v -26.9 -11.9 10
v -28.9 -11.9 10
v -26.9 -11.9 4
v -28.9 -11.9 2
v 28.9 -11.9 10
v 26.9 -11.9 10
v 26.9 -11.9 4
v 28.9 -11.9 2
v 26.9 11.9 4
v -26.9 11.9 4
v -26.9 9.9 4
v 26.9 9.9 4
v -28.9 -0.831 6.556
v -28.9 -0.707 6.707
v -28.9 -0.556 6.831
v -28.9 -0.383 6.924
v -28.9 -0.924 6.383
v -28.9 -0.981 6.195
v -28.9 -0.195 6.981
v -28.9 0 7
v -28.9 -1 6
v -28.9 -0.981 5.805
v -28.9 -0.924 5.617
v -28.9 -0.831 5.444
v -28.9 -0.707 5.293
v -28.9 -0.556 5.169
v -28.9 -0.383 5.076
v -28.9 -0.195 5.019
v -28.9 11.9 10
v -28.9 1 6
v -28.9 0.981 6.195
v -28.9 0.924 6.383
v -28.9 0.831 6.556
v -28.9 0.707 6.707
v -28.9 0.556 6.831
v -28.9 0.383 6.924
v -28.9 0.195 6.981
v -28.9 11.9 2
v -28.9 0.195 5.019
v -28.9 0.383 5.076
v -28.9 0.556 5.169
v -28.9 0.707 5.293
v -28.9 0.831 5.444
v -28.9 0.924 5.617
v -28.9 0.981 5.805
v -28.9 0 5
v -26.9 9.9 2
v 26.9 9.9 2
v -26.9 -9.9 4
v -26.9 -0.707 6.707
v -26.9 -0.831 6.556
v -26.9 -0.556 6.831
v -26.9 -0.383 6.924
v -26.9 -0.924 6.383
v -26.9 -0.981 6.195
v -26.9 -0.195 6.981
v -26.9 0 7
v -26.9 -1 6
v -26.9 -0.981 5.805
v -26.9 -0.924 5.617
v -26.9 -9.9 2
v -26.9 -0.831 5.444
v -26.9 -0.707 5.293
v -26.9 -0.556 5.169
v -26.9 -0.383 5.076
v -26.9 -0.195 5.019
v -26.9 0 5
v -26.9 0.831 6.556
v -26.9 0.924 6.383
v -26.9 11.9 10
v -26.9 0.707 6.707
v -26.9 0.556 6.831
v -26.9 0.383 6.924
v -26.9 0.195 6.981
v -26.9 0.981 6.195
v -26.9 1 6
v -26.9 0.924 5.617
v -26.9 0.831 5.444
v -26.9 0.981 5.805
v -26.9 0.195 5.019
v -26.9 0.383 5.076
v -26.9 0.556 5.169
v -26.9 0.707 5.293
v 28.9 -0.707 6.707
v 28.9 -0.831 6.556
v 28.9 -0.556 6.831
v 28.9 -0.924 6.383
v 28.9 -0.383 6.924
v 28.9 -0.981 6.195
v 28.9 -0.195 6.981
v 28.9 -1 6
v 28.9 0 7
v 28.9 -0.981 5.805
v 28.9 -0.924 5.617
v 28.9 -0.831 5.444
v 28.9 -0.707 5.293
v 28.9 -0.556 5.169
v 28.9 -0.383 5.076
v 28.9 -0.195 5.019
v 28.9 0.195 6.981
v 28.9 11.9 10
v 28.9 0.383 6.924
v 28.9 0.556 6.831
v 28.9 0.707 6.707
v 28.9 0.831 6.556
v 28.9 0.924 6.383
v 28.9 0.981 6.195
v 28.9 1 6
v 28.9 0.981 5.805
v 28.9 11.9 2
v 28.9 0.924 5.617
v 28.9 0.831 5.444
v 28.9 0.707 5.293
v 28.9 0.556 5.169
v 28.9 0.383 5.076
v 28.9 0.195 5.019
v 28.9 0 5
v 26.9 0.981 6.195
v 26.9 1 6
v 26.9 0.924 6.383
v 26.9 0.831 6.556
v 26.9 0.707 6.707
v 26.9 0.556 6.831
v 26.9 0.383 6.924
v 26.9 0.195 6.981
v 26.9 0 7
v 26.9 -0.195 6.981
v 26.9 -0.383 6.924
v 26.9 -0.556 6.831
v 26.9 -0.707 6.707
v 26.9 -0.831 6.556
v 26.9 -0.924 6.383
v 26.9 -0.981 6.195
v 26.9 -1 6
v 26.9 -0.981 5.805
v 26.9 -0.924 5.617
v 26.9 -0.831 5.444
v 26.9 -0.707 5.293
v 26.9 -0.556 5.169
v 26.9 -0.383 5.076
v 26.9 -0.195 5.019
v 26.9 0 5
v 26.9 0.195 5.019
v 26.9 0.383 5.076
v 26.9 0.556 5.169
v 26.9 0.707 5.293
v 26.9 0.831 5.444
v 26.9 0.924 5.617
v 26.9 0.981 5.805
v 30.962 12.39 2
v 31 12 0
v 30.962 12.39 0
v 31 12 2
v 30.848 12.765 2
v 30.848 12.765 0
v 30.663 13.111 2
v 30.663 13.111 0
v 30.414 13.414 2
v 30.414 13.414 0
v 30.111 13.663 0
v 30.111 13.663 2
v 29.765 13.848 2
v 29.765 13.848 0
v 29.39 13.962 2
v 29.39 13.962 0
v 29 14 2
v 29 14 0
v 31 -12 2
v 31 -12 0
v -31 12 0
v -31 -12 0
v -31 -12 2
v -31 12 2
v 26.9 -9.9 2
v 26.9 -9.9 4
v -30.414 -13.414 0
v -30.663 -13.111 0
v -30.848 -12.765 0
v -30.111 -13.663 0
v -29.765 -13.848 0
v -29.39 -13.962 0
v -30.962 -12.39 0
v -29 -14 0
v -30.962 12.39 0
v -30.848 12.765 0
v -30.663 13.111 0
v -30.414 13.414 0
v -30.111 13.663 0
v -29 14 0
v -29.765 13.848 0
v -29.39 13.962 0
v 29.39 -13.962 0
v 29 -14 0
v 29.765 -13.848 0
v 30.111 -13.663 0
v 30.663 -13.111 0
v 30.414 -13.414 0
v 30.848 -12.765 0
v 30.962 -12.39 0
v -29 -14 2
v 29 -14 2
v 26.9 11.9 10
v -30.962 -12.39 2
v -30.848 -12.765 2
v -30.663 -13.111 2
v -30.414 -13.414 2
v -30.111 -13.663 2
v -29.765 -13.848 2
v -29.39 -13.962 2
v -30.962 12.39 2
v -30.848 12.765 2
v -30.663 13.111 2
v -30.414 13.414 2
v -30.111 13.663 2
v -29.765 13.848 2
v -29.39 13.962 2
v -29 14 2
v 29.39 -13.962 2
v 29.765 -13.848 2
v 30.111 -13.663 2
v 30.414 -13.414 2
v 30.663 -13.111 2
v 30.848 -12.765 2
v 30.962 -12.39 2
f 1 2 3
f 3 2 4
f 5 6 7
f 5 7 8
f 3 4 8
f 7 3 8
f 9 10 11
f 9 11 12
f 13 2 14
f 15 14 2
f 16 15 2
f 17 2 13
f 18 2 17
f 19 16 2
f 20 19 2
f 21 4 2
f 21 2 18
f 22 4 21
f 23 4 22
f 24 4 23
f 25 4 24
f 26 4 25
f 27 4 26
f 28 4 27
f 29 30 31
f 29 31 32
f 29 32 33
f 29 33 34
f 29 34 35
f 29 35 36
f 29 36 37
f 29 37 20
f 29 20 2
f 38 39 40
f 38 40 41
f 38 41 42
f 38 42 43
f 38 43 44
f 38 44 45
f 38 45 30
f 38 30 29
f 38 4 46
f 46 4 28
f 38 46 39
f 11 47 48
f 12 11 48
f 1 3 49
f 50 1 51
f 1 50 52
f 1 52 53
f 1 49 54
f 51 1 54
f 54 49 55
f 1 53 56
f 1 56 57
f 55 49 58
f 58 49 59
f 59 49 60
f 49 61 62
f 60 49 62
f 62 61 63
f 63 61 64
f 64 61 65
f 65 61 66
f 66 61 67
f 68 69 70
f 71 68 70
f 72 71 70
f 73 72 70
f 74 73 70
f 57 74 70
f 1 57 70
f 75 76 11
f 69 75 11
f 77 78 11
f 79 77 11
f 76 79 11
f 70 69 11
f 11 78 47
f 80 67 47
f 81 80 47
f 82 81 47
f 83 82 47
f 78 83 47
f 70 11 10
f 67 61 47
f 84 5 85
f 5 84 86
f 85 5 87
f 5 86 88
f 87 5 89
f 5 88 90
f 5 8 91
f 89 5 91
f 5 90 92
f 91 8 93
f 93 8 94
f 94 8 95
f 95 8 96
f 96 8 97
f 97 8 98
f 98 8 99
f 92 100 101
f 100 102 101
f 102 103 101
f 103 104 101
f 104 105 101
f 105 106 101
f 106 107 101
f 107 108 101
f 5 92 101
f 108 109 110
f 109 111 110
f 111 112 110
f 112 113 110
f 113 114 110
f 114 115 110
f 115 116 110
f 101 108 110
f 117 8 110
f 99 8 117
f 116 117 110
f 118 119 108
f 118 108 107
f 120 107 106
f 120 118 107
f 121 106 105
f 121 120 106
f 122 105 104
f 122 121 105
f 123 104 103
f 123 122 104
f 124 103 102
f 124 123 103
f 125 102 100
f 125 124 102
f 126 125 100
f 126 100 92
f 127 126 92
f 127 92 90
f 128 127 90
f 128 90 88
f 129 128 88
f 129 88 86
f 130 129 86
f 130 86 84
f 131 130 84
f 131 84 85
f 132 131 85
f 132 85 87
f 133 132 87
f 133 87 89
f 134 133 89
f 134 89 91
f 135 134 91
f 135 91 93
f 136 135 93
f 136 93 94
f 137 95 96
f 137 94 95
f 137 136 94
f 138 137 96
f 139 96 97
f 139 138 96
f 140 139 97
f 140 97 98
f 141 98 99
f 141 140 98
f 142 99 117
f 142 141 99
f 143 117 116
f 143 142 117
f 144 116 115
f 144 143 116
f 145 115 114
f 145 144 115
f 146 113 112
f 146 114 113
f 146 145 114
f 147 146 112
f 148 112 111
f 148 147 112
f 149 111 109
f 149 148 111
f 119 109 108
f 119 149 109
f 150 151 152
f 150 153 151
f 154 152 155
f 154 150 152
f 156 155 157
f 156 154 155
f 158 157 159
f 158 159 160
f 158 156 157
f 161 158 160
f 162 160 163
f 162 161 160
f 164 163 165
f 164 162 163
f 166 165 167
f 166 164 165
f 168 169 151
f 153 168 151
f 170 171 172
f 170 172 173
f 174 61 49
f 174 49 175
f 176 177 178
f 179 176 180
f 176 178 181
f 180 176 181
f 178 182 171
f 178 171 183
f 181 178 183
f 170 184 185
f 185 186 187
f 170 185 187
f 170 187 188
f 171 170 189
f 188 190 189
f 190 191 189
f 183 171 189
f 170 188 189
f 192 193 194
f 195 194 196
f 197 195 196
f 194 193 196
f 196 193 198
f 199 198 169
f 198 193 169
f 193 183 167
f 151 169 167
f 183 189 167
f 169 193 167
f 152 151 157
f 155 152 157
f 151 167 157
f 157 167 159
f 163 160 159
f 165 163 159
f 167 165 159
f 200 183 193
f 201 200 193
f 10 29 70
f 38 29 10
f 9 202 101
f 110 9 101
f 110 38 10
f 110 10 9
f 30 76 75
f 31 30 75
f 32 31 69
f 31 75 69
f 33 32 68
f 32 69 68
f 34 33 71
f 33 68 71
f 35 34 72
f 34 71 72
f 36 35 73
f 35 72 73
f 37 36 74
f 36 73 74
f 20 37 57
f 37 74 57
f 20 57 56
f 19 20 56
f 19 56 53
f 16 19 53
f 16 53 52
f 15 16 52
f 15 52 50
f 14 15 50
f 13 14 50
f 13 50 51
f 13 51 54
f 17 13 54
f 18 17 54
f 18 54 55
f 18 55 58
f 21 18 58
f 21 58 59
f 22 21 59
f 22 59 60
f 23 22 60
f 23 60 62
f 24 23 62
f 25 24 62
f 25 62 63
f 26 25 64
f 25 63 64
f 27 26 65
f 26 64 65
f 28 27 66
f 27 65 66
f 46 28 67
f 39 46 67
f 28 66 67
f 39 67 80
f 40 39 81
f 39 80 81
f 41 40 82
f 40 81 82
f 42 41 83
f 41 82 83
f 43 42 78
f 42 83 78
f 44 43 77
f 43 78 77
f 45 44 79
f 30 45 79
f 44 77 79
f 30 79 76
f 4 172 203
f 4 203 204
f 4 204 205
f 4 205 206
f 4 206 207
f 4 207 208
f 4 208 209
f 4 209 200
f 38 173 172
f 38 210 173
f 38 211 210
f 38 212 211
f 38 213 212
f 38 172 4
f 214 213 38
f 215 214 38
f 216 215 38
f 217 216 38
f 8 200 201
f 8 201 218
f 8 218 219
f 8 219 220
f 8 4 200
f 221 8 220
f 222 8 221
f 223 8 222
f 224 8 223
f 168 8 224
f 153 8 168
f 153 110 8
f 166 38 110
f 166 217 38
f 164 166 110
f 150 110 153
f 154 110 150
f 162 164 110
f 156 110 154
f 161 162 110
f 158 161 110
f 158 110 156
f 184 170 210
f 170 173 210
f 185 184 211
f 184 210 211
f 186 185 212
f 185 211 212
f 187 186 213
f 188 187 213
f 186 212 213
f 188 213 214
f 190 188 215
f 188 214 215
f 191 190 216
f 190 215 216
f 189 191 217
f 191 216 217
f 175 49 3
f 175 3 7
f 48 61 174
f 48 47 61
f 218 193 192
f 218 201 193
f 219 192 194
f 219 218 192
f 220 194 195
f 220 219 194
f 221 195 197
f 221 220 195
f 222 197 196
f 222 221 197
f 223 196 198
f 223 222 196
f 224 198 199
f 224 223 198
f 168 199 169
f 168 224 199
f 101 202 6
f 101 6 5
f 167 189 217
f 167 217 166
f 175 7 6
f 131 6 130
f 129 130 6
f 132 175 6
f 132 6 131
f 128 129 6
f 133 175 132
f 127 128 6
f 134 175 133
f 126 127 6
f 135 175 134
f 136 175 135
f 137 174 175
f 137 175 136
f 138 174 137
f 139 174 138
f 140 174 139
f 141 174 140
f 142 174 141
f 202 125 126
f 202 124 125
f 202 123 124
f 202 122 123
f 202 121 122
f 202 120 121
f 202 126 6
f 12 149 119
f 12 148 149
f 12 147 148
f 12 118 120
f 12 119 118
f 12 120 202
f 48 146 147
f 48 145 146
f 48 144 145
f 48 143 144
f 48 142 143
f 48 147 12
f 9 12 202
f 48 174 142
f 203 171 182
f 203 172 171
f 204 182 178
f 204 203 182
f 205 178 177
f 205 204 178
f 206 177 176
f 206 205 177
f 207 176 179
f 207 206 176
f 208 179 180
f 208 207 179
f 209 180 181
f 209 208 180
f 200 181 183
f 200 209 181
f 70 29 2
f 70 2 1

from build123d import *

# Parameters (mm, degrees)
SKETCH_W          = 62
SKETCH_H          = 28
PAD_DEPTH         = 2
SKETCH001_W       = 57.8
SKETCH001_H       = 23.8
SKETCH001_W_2     = 53.8
SKETCH001_H_2     = 19.8
PAD001_DEPTH      = 4
SKETCH002_W       = 2
SKETCH002_H       = 23.8
PAD002_DEPTH      = 10
SKETCH003_R       = 1
POCKET_DEPTH      = 31.001
POCKET_DEPTH_BACK = -31.001
FILLET_R          = 2


with BuildPart() as part:
    # Sketch → Pad (new body)
    with BuildSketch(Plane.XY):
        Rectangle(SKETCH_W, SKETCH_H)
    extrude(amount=PAD_DEPTH)

    # Sketch001 → Pad001 (join)
    with BuildSketch(Plane.XY):
        Rectangle(SKETCH001_W, SKETCH001_H)
        Rectangle(SKETCH001_W_2, SKETCH001_H_2, mode=Mode.SUBTRACT)
    extrude(amount=PAD001_DEPTH)

    # Sketch002 → Pad002 (join)
    with BuildSketch(Plane.XY):
        with Locations((-27.9, 0)):
            Rectangle(SKETCH002_W, SKETCH002_H)
        with Locations((27.9, 0)):
            Rectangle(SKETCH002_W, SKETCH002_H)
    extrude(amount=PAD002_DEPTH)

    # Sketch003 → Pocket (cut, two sides)
    with BuildSketch(Plane.YZ) as pocket_sk:
        with Locations((0, 6)):
            Circle(SKETCH003_R)
    extrude(amount=-POCKET_DEPTH, mode=Mode.SUBTRACT)
    extrude(pocket_sk.sketch, amount=-POCKET_DEPTH_BACK, mode=Mode.SUBTRACT)

    # Fillet
    fillet_edges = [part.edges().sort_by_distance(p)[0] for p in [
        (31, 14, 1),
        (31, -14, 1),
        (-31, 14, 1),
        (-31, -14, 1),
    ]]
    fillet(fillet_edges, radius=FILLET_R)


solid = part.part
